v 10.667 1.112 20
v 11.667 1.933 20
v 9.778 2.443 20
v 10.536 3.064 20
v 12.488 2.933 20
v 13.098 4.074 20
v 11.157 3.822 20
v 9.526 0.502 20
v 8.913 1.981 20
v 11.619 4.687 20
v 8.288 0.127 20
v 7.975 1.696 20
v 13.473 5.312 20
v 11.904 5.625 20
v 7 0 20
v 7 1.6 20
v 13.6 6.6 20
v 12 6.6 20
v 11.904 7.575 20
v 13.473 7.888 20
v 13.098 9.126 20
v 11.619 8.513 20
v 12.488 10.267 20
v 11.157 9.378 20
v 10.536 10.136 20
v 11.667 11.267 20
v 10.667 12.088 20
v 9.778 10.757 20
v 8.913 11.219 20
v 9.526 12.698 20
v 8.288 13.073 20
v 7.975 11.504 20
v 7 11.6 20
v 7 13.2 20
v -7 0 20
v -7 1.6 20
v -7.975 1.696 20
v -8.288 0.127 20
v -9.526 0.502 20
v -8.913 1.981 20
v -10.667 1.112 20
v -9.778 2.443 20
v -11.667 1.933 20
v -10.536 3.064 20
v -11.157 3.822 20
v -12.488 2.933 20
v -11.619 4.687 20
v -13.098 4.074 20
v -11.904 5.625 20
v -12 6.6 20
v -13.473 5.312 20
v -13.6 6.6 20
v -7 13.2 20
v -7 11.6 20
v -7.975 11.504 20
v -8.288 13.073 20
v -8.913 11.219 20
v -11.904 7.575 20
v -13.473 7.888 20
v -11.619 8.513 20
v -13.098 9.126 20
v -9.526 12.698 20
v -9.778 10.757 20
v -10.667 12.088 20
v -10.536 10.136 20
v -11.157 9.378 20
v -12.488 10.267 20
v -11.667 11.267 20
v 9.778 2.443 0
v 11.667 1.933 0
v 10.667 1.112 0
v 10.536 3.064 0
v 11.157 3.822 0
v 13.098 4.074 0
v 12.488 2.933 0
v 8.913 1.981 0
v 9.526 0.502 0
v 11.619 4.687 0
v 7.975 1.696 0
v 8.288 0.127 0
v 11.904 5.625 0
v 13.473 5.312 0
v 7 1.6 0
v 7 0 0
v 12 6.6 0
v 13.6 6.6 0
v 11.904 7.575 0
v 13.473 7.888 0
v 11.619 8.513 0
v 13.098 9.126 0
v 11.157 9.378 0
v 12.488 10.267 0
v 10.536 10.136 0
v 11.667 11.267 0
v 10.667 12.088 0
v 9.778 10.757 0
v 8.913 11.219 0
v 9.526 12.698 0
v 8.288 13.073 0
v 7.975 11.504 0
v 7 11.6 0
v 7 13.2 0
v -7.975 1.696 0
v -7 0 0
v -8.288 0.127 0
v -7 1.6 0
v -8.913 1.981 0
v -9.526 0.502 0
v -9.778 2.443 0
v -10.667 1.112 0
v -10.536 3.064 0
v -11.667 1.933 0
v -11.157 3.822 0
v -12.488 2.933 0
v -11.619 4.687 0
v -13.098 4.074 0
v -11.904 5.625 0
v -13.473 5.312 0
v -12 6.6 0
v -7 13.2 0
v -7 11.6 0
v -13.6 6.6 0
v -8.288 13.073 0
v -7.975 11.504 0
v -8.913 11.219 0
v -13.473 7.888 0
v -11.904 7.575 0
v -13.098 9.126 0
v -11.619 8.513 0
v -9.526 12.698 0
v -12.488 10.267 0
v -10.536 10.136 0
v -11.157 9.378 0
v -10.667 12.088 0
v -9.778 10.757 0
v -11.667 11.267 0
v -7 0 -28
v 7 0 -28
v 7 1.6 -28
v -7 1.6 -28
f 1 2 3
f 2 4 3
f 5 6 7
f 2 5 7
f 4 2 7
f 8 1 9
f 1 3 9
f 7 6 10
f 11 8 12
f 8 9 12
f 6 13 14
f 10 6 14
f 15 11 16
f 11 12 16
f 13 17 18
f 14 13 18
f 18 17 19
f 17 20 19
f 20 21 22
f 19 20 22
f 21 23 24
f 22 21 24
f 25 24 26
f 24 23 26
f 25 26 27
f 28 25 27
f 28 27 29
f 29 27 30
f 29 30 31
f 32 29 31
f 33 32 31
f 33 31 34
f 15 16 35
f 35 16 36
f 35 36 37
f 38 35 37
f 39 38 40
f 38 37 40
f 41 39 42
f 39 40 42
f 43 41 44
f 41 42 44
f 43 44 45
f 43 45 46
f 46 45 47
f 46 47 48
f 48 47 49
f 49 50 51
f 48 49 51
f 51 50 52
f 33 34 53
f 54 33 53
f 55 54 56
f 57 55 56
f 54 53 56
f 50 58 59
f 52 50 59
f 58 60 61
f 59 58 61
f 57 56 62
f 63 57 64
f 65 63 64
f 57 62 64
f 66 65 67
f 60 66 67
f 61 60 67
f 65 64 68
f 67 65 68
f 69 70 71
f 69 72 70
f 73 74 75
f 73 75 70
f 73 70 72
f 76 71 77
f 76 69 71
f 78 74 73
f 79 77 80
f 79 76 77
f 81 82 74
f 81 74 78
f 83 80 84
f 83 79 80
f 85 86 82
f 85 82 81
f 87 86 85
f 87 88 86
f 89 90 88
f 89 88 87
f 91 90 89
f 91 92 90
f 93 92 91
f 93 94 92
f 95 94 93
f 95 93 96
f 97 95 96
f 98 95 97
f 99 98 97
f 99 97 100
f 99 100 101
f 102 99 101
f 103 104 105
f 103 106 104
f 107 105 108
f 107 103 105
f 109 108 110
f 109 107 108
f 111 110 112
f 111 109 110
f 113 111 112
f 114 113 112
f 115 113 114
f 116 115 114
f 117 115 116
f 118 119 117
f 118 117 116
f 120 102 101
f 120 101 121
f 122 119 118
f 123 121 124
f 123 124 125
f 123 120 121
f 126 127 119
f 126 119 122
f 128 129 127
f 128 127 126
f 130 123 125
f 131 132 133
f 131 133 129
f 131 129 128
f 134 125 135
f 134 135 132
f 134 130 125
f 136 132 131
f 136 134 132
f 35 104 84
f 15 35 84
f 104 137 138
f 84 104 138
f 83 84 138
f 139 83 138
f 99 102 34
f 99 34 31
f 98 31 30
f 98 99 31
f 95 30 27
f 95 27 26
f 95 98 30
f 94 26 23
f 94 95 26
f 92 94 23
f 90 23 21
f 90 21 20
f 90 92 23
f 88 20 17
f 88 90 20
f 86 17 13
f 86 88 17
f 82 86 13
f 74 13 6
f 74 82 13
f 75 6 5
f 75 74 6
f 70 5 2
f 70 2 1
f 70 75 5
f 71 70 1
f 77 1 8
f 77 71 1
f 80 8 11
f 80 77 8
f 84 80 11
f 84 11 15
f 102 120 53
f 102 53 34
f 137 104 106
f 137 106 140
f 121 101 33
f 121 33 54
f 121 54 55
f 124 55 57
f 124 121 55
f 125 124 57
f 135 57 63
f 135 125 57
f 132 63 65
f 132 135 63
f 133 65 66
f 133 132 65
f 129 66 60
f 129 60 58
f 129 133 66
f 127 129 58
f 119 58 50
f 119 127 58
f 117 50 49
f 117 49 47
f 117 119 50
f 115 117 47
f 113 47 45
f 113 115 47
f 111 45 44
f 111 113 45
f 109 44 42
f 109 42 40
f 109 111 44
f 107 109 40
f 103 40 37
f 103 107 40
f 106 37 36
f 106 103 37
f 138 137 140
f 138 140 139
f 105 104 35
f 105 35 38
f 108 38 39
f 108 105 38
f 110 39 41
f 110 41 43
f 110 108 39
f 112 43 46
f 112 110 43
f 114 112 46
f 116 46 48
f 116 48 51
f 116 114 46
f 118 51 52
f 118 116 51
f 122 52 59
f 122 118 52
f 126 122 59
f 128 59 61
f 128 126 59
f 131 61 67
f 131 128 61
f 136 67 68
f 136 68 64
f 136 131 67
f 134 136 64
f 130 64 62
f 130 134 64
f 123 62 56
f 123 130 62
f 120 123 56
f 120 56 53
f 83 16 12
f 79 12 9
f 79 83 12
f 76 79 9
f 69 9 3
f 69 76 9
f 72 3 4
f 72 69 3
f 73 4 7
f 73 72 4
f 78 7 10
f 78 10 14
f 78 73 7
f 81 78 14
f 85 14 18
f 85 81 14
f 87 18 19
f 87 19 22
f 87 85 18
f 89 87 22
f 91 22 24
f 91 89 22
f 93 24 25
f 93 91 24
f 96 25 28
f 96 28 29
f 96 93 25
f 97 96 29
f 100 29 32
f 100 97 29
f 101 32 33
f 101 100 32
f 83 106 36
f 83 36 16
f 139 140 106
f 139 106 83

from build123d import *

# Parameters (mm, degrees)
SKETCH1_W           = 14
SKETCH1_H           = 28
BOSS_EXTRUDE1_DEPTH = 1.6
SKETCH2_W           = 14
SKETCH2_H           = 1.6
BOSS_EXTRUDE2_DEPTH = 20


with BuildPart() as part:
    # Sketch1 → Boss-Extrude1 (new body)
    with BuildSketch(Plane(origin=(0, 0, 0), x_dir=(1, 0, 0), z_dir=(0, 1, 0))):
        with Locations((0, 14)):
            Rectangle(SKETCH1_W, SKETCH1_H)
    extrude(amount=BOSS_EXTRUDE1_DEPTH)

    # Sketch2 → Boss-Extrude2 (add)
    with BuildSketch(Plane.XY):
        with BuildLine():
            Line((-7, 13.2), (7, 13.2))
            ThreePointArc((7, 13.2), (13.6, 6.6), (7, 0))
            Line((7, 0), (7, 1.6))
            ThreePointArc((7, 1.6), (12, 6.6), (7, 11.6))
            Line((7, 11.6), (-7, 11.6))
            ThreePointArc((-7, 11.6), (-12, 6.6), (-7, 1.6))
            Line((-7, 1.6), (-7, 0))
            ThreePointArc((-7, 0), (-13.6, 6.6), (-7, 13.2))
        make_face()
        with Locations((0, 0.8)):
            Rectangle(SKETCH2_W, SKETCH2_H)
    extrude(amount=BOSS_EXTRUDE2_DEPTH)


solid = part.part
